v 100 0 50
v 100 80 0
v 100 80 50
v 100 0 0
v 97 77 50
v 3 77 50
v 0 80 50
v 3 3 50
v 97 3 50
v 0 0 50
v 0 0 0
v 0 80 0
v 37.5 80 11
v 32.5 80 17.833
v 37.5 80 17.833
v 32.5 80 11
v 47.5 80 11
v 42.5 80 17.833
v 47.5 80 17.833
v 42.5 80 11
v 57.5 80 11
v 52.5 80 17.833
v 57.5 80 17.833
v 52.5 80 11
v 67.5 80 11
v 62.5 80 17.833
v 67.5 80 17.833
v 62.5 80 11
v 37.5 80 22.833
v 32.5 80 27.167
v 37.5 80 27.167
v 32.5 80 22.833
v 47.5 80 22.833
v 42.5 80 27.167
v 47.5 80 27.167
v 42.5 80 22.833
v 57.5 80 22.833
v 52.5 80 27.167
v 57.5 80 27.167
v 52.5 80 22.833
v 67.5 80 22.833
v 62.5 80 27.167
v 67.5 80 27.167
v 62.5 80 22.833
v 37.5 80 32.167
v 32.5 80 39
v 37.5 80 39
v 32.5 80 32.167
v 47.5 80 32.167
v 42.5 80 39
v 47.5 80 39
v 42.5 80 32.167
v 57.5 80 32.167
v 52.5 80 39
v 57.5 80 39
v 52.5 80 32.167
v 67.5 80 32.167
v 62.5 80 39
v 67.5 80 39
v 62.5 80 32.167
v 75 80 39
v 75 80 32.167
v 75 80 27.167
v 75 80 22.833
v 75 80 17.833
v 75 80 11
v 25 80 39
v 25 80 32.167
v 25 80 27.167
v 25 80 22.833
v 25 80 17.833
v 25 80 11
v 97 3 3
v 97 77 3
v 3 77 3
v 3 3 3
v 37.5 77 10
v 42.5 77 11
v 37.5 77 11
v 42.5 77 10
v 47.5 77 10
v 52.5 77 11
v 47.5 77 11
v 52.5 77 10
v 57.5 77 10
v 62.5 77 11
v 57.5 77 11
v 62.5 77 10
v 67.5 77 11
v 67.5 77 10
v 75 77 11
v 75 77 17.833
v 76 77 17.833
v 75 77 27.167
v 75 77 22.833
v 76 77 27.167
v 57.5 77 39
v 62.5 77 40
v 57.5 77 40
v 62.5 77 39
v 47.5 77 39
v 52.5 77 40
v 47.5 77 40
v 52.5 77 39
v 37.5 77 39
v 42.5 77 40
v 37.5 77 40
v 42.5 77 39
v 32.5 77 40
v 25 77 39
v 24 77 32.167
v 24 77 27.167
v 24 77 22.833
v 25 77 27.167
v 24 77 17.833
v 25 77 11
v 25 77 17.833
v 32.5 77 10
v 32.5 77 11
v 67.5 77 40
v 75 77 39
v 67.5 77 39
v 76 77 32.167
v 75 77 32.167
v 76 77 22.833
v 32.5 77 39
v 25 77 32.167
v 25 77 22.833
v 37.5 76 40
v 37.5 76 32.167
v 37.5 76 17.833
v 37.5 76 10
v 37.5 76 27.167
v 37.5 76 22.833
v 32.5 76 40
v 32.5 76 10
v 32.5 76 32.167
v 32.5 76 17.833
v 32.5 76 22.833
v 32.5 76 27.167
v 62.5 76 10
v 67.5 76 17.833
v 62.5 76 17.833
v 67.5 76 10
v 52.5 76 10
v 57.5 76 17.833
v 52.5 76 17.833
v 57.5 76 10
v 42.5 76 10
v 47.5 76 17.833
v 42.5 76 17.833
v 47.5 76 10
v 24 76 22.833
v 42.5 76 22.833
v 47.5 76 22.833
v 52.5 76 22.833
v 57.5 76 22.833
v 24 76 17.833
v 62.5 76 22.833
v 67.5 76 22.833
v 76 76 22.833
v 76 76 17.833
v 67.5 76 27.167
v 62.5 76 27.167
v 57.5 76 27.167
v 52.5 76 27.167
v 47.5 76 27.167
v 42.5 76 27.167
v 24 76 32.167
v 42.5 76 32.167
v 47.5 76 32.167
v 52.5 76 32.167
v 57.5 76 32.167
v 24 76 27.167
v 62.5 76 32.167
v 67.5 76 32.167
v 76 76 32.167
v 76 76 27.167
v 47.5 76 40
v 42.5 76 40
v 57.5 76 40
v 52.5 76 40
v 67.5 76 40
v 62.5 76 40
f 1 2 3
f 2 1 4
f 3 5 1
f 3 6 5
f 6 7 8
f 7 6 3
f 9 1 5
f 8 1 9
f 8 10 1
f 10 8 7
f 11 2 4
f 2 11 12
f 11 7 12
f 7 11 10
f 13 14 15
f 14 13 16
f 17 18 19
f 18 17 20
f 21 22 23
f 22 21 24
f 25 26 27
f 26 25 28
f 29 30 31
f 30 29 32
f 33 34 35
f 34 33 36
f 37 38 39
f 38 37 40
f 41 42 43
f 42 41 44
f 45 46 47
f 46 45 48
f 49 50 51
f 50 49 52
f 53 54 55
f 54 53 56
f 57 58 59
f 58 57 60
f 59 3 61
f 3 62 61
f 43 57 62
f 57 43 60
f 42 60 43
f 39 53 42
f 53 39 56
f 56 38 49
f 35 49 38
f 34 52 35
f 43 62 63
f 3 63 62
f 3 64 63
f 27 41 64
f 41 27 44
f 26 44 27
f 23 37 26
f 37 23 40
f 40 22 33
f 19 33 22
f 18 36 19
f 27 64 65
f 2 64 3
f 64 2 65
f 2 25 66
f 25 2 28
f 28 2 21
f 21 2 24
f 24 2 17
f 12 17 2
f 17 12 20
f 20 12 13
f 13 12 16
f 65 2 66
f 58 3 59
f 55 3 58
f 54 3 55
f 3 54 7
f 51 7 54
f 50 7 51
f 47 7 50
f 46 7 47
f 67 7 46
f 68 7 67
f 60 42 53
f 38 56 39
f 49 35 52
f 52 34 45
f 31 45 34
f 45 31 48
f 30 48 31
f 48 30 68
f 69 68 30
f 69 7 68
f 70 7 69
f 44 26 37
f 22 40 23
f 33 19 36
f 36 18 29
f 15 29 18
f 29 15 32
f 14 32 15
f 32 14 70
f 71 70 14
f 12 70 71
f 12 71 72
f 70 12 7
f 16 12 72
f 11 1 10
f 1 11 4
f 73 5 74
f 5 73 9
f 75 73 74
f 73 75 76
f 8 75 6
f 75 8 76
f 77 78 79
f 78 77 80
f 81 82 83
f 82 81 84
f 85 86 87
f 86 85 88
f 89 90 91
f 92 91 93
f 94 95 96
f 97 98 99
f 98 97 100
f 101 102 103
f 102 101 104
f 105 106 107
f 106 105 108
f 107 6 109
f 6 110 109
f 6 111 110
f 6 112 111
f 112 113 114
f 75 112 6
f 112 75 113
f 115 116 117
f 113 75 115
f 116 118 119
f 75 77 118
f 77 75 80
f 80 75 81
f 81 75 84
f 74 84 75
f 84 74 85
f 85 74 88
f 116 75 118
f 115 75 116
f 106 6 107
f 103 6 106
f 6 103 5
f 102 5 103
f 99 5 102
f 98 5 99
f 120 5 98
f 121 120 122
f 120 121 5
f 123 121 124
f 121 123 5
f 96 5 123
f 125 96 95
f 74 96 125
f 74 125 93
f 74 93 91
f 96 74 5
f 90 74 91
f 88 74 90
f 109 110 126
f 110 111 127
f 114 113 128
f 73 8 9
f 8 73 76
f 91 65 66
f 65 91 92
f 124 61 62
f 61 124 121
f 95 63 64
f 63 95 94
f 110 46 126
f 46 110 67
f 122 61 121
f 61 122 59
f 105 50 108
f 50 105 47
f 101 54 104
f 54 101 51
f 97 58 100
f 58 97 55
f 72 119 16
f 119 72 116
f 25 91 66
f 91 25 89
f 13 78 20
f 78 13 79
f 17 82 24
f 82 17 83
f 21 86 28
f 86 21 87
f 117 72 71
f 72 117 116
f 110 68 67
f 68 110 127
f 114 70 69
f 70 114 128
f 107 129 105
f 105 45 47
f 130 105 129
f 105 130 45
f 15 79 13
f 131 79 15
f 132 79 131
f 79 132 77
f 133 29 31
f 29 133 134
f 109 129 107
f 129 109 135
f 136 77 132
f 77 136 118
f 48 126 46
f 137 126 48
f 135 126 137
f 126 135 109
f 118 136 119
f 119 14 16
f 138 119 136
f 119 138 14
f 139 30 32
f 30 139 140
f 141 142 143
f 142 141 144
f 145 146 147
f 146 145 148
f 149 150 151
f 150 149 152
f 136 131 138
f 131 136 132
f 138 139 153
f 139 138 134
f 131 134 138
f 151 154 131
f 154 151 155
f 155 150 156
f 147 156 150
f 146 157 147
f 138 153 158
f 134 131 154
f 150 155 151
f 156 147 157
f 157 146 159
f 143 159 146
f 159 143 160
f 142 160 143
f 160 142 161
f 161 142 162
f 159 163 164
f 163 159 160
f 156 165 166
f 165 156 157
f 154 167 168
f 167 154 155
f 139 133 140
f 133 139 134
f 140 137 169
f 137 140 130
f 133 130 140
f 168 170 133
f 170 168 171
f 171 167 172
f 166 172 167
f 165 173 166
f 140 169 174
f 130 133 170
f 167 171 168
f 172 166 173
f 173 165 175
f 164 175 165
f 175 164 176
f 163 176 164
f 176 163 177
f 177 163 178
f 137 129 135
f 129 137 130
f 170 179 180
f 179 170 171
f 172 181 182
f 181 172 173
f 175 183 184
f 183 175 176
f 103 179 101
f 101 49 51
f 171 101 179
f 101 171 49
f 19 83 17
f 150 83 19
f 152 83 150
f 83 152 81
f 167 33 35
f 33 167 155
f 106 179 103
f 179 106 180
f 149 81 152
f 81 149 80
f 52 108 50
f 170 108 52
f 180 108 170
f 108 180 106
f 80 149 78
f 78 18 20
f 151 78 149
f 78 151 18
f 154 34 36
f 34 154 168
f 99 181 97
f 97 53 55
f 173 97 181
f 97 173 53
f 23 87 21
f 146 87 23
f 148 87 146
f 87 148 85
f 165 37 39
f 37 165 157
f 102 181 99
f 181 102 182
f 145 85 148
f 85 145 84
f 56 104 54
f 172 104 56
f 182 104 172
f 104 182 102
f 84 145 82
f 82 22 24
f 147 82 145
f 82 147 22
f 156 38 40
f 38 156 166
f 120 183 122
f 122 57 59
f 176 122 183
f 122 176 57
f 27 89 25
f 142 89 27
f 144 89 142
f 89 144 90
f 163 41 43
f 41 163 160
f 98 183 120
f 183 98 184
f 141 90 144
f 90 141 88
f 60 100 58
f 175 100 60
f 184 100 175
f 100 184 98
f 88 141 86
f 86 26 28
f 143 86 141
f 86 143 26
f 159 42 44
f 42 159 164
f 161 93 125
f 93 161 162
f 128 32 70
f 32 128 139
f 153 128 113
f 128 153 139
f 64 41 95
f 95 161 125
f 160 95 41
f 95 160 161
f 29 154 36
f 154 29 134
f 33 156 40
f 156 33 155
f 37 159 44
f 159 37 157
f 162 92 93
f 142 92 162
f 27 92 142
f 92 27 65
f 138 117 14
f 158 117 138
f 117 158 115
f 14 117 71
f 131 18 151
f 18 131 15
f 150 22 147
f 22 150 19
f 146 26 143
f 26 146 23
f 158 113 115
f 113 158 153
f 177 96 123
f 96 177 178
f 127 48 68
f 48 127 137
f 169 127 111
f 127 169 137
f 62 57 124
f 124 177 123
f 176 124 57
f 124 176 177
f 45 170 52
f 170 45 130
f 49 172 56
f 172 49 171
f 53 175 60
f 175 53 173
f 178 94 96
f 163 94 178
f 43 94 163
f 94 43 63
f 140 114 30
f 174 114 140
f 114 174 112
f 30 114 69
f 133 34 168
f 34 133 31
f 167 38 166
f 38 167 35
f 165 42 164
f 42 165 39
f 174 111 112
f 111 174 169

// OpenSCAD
$fn = 32;

// ----------------------------------------------------------------------
// Vent box: crossgrid enclosure
// ----------------------------------------------------------------------

// --- parameters (mm) ---
box_l = 100;              // box length, X
box_w = 80;               // box width, Y
box_h = 50;               // box height, Z
wall_t = 3;               // shell wall thickness
win_l = 50;               // vent window width, X
win_h = 28;               // vent window height, Z
bar_w = 5;                // grid bar width
n_v = 4;                  // vertical bar count
n_h = 2;                  // horizontal bar count

win_z0 = (box_h - win_h) / 2;  // window lower edge Z
v_step = win_l / (n_v + 1);  // vertical bar step
h_step = win_h / (n_h + 1);  // horizontal bar step

difference() {
  union() {
    difference() {
      cube([box_l, box_w, box_h]);
  translate([wall_t, wall_t, wall_t])
    cube([box_l - 2 * wall_t, box_w - 2 * wall_t, box_h]);
  translate([(box_l - win_l) / 2, box_w - wall_t - 1, win_z0])
    cube([win_l, wall_t + 2, win_h]);
    }
    for (i = [1 : n_v])
      translate([(box_l - win_l) / 2 + i * v_step - bar_w / 2,
                 box_w - wall_t - 1, win_z0 - 1])
        cube([bar_w, wall_t + 1, win_h + 2]);
    for (i = [1 : n_h])
      translate([(box_l - win_l) / 2 - 1, box_w - wall_t - 1,
                 win_z0 + i * h_step - bar_w / 2])
        cube([win_l + 2, wall_t + 1, bar_w]);
  }
}
